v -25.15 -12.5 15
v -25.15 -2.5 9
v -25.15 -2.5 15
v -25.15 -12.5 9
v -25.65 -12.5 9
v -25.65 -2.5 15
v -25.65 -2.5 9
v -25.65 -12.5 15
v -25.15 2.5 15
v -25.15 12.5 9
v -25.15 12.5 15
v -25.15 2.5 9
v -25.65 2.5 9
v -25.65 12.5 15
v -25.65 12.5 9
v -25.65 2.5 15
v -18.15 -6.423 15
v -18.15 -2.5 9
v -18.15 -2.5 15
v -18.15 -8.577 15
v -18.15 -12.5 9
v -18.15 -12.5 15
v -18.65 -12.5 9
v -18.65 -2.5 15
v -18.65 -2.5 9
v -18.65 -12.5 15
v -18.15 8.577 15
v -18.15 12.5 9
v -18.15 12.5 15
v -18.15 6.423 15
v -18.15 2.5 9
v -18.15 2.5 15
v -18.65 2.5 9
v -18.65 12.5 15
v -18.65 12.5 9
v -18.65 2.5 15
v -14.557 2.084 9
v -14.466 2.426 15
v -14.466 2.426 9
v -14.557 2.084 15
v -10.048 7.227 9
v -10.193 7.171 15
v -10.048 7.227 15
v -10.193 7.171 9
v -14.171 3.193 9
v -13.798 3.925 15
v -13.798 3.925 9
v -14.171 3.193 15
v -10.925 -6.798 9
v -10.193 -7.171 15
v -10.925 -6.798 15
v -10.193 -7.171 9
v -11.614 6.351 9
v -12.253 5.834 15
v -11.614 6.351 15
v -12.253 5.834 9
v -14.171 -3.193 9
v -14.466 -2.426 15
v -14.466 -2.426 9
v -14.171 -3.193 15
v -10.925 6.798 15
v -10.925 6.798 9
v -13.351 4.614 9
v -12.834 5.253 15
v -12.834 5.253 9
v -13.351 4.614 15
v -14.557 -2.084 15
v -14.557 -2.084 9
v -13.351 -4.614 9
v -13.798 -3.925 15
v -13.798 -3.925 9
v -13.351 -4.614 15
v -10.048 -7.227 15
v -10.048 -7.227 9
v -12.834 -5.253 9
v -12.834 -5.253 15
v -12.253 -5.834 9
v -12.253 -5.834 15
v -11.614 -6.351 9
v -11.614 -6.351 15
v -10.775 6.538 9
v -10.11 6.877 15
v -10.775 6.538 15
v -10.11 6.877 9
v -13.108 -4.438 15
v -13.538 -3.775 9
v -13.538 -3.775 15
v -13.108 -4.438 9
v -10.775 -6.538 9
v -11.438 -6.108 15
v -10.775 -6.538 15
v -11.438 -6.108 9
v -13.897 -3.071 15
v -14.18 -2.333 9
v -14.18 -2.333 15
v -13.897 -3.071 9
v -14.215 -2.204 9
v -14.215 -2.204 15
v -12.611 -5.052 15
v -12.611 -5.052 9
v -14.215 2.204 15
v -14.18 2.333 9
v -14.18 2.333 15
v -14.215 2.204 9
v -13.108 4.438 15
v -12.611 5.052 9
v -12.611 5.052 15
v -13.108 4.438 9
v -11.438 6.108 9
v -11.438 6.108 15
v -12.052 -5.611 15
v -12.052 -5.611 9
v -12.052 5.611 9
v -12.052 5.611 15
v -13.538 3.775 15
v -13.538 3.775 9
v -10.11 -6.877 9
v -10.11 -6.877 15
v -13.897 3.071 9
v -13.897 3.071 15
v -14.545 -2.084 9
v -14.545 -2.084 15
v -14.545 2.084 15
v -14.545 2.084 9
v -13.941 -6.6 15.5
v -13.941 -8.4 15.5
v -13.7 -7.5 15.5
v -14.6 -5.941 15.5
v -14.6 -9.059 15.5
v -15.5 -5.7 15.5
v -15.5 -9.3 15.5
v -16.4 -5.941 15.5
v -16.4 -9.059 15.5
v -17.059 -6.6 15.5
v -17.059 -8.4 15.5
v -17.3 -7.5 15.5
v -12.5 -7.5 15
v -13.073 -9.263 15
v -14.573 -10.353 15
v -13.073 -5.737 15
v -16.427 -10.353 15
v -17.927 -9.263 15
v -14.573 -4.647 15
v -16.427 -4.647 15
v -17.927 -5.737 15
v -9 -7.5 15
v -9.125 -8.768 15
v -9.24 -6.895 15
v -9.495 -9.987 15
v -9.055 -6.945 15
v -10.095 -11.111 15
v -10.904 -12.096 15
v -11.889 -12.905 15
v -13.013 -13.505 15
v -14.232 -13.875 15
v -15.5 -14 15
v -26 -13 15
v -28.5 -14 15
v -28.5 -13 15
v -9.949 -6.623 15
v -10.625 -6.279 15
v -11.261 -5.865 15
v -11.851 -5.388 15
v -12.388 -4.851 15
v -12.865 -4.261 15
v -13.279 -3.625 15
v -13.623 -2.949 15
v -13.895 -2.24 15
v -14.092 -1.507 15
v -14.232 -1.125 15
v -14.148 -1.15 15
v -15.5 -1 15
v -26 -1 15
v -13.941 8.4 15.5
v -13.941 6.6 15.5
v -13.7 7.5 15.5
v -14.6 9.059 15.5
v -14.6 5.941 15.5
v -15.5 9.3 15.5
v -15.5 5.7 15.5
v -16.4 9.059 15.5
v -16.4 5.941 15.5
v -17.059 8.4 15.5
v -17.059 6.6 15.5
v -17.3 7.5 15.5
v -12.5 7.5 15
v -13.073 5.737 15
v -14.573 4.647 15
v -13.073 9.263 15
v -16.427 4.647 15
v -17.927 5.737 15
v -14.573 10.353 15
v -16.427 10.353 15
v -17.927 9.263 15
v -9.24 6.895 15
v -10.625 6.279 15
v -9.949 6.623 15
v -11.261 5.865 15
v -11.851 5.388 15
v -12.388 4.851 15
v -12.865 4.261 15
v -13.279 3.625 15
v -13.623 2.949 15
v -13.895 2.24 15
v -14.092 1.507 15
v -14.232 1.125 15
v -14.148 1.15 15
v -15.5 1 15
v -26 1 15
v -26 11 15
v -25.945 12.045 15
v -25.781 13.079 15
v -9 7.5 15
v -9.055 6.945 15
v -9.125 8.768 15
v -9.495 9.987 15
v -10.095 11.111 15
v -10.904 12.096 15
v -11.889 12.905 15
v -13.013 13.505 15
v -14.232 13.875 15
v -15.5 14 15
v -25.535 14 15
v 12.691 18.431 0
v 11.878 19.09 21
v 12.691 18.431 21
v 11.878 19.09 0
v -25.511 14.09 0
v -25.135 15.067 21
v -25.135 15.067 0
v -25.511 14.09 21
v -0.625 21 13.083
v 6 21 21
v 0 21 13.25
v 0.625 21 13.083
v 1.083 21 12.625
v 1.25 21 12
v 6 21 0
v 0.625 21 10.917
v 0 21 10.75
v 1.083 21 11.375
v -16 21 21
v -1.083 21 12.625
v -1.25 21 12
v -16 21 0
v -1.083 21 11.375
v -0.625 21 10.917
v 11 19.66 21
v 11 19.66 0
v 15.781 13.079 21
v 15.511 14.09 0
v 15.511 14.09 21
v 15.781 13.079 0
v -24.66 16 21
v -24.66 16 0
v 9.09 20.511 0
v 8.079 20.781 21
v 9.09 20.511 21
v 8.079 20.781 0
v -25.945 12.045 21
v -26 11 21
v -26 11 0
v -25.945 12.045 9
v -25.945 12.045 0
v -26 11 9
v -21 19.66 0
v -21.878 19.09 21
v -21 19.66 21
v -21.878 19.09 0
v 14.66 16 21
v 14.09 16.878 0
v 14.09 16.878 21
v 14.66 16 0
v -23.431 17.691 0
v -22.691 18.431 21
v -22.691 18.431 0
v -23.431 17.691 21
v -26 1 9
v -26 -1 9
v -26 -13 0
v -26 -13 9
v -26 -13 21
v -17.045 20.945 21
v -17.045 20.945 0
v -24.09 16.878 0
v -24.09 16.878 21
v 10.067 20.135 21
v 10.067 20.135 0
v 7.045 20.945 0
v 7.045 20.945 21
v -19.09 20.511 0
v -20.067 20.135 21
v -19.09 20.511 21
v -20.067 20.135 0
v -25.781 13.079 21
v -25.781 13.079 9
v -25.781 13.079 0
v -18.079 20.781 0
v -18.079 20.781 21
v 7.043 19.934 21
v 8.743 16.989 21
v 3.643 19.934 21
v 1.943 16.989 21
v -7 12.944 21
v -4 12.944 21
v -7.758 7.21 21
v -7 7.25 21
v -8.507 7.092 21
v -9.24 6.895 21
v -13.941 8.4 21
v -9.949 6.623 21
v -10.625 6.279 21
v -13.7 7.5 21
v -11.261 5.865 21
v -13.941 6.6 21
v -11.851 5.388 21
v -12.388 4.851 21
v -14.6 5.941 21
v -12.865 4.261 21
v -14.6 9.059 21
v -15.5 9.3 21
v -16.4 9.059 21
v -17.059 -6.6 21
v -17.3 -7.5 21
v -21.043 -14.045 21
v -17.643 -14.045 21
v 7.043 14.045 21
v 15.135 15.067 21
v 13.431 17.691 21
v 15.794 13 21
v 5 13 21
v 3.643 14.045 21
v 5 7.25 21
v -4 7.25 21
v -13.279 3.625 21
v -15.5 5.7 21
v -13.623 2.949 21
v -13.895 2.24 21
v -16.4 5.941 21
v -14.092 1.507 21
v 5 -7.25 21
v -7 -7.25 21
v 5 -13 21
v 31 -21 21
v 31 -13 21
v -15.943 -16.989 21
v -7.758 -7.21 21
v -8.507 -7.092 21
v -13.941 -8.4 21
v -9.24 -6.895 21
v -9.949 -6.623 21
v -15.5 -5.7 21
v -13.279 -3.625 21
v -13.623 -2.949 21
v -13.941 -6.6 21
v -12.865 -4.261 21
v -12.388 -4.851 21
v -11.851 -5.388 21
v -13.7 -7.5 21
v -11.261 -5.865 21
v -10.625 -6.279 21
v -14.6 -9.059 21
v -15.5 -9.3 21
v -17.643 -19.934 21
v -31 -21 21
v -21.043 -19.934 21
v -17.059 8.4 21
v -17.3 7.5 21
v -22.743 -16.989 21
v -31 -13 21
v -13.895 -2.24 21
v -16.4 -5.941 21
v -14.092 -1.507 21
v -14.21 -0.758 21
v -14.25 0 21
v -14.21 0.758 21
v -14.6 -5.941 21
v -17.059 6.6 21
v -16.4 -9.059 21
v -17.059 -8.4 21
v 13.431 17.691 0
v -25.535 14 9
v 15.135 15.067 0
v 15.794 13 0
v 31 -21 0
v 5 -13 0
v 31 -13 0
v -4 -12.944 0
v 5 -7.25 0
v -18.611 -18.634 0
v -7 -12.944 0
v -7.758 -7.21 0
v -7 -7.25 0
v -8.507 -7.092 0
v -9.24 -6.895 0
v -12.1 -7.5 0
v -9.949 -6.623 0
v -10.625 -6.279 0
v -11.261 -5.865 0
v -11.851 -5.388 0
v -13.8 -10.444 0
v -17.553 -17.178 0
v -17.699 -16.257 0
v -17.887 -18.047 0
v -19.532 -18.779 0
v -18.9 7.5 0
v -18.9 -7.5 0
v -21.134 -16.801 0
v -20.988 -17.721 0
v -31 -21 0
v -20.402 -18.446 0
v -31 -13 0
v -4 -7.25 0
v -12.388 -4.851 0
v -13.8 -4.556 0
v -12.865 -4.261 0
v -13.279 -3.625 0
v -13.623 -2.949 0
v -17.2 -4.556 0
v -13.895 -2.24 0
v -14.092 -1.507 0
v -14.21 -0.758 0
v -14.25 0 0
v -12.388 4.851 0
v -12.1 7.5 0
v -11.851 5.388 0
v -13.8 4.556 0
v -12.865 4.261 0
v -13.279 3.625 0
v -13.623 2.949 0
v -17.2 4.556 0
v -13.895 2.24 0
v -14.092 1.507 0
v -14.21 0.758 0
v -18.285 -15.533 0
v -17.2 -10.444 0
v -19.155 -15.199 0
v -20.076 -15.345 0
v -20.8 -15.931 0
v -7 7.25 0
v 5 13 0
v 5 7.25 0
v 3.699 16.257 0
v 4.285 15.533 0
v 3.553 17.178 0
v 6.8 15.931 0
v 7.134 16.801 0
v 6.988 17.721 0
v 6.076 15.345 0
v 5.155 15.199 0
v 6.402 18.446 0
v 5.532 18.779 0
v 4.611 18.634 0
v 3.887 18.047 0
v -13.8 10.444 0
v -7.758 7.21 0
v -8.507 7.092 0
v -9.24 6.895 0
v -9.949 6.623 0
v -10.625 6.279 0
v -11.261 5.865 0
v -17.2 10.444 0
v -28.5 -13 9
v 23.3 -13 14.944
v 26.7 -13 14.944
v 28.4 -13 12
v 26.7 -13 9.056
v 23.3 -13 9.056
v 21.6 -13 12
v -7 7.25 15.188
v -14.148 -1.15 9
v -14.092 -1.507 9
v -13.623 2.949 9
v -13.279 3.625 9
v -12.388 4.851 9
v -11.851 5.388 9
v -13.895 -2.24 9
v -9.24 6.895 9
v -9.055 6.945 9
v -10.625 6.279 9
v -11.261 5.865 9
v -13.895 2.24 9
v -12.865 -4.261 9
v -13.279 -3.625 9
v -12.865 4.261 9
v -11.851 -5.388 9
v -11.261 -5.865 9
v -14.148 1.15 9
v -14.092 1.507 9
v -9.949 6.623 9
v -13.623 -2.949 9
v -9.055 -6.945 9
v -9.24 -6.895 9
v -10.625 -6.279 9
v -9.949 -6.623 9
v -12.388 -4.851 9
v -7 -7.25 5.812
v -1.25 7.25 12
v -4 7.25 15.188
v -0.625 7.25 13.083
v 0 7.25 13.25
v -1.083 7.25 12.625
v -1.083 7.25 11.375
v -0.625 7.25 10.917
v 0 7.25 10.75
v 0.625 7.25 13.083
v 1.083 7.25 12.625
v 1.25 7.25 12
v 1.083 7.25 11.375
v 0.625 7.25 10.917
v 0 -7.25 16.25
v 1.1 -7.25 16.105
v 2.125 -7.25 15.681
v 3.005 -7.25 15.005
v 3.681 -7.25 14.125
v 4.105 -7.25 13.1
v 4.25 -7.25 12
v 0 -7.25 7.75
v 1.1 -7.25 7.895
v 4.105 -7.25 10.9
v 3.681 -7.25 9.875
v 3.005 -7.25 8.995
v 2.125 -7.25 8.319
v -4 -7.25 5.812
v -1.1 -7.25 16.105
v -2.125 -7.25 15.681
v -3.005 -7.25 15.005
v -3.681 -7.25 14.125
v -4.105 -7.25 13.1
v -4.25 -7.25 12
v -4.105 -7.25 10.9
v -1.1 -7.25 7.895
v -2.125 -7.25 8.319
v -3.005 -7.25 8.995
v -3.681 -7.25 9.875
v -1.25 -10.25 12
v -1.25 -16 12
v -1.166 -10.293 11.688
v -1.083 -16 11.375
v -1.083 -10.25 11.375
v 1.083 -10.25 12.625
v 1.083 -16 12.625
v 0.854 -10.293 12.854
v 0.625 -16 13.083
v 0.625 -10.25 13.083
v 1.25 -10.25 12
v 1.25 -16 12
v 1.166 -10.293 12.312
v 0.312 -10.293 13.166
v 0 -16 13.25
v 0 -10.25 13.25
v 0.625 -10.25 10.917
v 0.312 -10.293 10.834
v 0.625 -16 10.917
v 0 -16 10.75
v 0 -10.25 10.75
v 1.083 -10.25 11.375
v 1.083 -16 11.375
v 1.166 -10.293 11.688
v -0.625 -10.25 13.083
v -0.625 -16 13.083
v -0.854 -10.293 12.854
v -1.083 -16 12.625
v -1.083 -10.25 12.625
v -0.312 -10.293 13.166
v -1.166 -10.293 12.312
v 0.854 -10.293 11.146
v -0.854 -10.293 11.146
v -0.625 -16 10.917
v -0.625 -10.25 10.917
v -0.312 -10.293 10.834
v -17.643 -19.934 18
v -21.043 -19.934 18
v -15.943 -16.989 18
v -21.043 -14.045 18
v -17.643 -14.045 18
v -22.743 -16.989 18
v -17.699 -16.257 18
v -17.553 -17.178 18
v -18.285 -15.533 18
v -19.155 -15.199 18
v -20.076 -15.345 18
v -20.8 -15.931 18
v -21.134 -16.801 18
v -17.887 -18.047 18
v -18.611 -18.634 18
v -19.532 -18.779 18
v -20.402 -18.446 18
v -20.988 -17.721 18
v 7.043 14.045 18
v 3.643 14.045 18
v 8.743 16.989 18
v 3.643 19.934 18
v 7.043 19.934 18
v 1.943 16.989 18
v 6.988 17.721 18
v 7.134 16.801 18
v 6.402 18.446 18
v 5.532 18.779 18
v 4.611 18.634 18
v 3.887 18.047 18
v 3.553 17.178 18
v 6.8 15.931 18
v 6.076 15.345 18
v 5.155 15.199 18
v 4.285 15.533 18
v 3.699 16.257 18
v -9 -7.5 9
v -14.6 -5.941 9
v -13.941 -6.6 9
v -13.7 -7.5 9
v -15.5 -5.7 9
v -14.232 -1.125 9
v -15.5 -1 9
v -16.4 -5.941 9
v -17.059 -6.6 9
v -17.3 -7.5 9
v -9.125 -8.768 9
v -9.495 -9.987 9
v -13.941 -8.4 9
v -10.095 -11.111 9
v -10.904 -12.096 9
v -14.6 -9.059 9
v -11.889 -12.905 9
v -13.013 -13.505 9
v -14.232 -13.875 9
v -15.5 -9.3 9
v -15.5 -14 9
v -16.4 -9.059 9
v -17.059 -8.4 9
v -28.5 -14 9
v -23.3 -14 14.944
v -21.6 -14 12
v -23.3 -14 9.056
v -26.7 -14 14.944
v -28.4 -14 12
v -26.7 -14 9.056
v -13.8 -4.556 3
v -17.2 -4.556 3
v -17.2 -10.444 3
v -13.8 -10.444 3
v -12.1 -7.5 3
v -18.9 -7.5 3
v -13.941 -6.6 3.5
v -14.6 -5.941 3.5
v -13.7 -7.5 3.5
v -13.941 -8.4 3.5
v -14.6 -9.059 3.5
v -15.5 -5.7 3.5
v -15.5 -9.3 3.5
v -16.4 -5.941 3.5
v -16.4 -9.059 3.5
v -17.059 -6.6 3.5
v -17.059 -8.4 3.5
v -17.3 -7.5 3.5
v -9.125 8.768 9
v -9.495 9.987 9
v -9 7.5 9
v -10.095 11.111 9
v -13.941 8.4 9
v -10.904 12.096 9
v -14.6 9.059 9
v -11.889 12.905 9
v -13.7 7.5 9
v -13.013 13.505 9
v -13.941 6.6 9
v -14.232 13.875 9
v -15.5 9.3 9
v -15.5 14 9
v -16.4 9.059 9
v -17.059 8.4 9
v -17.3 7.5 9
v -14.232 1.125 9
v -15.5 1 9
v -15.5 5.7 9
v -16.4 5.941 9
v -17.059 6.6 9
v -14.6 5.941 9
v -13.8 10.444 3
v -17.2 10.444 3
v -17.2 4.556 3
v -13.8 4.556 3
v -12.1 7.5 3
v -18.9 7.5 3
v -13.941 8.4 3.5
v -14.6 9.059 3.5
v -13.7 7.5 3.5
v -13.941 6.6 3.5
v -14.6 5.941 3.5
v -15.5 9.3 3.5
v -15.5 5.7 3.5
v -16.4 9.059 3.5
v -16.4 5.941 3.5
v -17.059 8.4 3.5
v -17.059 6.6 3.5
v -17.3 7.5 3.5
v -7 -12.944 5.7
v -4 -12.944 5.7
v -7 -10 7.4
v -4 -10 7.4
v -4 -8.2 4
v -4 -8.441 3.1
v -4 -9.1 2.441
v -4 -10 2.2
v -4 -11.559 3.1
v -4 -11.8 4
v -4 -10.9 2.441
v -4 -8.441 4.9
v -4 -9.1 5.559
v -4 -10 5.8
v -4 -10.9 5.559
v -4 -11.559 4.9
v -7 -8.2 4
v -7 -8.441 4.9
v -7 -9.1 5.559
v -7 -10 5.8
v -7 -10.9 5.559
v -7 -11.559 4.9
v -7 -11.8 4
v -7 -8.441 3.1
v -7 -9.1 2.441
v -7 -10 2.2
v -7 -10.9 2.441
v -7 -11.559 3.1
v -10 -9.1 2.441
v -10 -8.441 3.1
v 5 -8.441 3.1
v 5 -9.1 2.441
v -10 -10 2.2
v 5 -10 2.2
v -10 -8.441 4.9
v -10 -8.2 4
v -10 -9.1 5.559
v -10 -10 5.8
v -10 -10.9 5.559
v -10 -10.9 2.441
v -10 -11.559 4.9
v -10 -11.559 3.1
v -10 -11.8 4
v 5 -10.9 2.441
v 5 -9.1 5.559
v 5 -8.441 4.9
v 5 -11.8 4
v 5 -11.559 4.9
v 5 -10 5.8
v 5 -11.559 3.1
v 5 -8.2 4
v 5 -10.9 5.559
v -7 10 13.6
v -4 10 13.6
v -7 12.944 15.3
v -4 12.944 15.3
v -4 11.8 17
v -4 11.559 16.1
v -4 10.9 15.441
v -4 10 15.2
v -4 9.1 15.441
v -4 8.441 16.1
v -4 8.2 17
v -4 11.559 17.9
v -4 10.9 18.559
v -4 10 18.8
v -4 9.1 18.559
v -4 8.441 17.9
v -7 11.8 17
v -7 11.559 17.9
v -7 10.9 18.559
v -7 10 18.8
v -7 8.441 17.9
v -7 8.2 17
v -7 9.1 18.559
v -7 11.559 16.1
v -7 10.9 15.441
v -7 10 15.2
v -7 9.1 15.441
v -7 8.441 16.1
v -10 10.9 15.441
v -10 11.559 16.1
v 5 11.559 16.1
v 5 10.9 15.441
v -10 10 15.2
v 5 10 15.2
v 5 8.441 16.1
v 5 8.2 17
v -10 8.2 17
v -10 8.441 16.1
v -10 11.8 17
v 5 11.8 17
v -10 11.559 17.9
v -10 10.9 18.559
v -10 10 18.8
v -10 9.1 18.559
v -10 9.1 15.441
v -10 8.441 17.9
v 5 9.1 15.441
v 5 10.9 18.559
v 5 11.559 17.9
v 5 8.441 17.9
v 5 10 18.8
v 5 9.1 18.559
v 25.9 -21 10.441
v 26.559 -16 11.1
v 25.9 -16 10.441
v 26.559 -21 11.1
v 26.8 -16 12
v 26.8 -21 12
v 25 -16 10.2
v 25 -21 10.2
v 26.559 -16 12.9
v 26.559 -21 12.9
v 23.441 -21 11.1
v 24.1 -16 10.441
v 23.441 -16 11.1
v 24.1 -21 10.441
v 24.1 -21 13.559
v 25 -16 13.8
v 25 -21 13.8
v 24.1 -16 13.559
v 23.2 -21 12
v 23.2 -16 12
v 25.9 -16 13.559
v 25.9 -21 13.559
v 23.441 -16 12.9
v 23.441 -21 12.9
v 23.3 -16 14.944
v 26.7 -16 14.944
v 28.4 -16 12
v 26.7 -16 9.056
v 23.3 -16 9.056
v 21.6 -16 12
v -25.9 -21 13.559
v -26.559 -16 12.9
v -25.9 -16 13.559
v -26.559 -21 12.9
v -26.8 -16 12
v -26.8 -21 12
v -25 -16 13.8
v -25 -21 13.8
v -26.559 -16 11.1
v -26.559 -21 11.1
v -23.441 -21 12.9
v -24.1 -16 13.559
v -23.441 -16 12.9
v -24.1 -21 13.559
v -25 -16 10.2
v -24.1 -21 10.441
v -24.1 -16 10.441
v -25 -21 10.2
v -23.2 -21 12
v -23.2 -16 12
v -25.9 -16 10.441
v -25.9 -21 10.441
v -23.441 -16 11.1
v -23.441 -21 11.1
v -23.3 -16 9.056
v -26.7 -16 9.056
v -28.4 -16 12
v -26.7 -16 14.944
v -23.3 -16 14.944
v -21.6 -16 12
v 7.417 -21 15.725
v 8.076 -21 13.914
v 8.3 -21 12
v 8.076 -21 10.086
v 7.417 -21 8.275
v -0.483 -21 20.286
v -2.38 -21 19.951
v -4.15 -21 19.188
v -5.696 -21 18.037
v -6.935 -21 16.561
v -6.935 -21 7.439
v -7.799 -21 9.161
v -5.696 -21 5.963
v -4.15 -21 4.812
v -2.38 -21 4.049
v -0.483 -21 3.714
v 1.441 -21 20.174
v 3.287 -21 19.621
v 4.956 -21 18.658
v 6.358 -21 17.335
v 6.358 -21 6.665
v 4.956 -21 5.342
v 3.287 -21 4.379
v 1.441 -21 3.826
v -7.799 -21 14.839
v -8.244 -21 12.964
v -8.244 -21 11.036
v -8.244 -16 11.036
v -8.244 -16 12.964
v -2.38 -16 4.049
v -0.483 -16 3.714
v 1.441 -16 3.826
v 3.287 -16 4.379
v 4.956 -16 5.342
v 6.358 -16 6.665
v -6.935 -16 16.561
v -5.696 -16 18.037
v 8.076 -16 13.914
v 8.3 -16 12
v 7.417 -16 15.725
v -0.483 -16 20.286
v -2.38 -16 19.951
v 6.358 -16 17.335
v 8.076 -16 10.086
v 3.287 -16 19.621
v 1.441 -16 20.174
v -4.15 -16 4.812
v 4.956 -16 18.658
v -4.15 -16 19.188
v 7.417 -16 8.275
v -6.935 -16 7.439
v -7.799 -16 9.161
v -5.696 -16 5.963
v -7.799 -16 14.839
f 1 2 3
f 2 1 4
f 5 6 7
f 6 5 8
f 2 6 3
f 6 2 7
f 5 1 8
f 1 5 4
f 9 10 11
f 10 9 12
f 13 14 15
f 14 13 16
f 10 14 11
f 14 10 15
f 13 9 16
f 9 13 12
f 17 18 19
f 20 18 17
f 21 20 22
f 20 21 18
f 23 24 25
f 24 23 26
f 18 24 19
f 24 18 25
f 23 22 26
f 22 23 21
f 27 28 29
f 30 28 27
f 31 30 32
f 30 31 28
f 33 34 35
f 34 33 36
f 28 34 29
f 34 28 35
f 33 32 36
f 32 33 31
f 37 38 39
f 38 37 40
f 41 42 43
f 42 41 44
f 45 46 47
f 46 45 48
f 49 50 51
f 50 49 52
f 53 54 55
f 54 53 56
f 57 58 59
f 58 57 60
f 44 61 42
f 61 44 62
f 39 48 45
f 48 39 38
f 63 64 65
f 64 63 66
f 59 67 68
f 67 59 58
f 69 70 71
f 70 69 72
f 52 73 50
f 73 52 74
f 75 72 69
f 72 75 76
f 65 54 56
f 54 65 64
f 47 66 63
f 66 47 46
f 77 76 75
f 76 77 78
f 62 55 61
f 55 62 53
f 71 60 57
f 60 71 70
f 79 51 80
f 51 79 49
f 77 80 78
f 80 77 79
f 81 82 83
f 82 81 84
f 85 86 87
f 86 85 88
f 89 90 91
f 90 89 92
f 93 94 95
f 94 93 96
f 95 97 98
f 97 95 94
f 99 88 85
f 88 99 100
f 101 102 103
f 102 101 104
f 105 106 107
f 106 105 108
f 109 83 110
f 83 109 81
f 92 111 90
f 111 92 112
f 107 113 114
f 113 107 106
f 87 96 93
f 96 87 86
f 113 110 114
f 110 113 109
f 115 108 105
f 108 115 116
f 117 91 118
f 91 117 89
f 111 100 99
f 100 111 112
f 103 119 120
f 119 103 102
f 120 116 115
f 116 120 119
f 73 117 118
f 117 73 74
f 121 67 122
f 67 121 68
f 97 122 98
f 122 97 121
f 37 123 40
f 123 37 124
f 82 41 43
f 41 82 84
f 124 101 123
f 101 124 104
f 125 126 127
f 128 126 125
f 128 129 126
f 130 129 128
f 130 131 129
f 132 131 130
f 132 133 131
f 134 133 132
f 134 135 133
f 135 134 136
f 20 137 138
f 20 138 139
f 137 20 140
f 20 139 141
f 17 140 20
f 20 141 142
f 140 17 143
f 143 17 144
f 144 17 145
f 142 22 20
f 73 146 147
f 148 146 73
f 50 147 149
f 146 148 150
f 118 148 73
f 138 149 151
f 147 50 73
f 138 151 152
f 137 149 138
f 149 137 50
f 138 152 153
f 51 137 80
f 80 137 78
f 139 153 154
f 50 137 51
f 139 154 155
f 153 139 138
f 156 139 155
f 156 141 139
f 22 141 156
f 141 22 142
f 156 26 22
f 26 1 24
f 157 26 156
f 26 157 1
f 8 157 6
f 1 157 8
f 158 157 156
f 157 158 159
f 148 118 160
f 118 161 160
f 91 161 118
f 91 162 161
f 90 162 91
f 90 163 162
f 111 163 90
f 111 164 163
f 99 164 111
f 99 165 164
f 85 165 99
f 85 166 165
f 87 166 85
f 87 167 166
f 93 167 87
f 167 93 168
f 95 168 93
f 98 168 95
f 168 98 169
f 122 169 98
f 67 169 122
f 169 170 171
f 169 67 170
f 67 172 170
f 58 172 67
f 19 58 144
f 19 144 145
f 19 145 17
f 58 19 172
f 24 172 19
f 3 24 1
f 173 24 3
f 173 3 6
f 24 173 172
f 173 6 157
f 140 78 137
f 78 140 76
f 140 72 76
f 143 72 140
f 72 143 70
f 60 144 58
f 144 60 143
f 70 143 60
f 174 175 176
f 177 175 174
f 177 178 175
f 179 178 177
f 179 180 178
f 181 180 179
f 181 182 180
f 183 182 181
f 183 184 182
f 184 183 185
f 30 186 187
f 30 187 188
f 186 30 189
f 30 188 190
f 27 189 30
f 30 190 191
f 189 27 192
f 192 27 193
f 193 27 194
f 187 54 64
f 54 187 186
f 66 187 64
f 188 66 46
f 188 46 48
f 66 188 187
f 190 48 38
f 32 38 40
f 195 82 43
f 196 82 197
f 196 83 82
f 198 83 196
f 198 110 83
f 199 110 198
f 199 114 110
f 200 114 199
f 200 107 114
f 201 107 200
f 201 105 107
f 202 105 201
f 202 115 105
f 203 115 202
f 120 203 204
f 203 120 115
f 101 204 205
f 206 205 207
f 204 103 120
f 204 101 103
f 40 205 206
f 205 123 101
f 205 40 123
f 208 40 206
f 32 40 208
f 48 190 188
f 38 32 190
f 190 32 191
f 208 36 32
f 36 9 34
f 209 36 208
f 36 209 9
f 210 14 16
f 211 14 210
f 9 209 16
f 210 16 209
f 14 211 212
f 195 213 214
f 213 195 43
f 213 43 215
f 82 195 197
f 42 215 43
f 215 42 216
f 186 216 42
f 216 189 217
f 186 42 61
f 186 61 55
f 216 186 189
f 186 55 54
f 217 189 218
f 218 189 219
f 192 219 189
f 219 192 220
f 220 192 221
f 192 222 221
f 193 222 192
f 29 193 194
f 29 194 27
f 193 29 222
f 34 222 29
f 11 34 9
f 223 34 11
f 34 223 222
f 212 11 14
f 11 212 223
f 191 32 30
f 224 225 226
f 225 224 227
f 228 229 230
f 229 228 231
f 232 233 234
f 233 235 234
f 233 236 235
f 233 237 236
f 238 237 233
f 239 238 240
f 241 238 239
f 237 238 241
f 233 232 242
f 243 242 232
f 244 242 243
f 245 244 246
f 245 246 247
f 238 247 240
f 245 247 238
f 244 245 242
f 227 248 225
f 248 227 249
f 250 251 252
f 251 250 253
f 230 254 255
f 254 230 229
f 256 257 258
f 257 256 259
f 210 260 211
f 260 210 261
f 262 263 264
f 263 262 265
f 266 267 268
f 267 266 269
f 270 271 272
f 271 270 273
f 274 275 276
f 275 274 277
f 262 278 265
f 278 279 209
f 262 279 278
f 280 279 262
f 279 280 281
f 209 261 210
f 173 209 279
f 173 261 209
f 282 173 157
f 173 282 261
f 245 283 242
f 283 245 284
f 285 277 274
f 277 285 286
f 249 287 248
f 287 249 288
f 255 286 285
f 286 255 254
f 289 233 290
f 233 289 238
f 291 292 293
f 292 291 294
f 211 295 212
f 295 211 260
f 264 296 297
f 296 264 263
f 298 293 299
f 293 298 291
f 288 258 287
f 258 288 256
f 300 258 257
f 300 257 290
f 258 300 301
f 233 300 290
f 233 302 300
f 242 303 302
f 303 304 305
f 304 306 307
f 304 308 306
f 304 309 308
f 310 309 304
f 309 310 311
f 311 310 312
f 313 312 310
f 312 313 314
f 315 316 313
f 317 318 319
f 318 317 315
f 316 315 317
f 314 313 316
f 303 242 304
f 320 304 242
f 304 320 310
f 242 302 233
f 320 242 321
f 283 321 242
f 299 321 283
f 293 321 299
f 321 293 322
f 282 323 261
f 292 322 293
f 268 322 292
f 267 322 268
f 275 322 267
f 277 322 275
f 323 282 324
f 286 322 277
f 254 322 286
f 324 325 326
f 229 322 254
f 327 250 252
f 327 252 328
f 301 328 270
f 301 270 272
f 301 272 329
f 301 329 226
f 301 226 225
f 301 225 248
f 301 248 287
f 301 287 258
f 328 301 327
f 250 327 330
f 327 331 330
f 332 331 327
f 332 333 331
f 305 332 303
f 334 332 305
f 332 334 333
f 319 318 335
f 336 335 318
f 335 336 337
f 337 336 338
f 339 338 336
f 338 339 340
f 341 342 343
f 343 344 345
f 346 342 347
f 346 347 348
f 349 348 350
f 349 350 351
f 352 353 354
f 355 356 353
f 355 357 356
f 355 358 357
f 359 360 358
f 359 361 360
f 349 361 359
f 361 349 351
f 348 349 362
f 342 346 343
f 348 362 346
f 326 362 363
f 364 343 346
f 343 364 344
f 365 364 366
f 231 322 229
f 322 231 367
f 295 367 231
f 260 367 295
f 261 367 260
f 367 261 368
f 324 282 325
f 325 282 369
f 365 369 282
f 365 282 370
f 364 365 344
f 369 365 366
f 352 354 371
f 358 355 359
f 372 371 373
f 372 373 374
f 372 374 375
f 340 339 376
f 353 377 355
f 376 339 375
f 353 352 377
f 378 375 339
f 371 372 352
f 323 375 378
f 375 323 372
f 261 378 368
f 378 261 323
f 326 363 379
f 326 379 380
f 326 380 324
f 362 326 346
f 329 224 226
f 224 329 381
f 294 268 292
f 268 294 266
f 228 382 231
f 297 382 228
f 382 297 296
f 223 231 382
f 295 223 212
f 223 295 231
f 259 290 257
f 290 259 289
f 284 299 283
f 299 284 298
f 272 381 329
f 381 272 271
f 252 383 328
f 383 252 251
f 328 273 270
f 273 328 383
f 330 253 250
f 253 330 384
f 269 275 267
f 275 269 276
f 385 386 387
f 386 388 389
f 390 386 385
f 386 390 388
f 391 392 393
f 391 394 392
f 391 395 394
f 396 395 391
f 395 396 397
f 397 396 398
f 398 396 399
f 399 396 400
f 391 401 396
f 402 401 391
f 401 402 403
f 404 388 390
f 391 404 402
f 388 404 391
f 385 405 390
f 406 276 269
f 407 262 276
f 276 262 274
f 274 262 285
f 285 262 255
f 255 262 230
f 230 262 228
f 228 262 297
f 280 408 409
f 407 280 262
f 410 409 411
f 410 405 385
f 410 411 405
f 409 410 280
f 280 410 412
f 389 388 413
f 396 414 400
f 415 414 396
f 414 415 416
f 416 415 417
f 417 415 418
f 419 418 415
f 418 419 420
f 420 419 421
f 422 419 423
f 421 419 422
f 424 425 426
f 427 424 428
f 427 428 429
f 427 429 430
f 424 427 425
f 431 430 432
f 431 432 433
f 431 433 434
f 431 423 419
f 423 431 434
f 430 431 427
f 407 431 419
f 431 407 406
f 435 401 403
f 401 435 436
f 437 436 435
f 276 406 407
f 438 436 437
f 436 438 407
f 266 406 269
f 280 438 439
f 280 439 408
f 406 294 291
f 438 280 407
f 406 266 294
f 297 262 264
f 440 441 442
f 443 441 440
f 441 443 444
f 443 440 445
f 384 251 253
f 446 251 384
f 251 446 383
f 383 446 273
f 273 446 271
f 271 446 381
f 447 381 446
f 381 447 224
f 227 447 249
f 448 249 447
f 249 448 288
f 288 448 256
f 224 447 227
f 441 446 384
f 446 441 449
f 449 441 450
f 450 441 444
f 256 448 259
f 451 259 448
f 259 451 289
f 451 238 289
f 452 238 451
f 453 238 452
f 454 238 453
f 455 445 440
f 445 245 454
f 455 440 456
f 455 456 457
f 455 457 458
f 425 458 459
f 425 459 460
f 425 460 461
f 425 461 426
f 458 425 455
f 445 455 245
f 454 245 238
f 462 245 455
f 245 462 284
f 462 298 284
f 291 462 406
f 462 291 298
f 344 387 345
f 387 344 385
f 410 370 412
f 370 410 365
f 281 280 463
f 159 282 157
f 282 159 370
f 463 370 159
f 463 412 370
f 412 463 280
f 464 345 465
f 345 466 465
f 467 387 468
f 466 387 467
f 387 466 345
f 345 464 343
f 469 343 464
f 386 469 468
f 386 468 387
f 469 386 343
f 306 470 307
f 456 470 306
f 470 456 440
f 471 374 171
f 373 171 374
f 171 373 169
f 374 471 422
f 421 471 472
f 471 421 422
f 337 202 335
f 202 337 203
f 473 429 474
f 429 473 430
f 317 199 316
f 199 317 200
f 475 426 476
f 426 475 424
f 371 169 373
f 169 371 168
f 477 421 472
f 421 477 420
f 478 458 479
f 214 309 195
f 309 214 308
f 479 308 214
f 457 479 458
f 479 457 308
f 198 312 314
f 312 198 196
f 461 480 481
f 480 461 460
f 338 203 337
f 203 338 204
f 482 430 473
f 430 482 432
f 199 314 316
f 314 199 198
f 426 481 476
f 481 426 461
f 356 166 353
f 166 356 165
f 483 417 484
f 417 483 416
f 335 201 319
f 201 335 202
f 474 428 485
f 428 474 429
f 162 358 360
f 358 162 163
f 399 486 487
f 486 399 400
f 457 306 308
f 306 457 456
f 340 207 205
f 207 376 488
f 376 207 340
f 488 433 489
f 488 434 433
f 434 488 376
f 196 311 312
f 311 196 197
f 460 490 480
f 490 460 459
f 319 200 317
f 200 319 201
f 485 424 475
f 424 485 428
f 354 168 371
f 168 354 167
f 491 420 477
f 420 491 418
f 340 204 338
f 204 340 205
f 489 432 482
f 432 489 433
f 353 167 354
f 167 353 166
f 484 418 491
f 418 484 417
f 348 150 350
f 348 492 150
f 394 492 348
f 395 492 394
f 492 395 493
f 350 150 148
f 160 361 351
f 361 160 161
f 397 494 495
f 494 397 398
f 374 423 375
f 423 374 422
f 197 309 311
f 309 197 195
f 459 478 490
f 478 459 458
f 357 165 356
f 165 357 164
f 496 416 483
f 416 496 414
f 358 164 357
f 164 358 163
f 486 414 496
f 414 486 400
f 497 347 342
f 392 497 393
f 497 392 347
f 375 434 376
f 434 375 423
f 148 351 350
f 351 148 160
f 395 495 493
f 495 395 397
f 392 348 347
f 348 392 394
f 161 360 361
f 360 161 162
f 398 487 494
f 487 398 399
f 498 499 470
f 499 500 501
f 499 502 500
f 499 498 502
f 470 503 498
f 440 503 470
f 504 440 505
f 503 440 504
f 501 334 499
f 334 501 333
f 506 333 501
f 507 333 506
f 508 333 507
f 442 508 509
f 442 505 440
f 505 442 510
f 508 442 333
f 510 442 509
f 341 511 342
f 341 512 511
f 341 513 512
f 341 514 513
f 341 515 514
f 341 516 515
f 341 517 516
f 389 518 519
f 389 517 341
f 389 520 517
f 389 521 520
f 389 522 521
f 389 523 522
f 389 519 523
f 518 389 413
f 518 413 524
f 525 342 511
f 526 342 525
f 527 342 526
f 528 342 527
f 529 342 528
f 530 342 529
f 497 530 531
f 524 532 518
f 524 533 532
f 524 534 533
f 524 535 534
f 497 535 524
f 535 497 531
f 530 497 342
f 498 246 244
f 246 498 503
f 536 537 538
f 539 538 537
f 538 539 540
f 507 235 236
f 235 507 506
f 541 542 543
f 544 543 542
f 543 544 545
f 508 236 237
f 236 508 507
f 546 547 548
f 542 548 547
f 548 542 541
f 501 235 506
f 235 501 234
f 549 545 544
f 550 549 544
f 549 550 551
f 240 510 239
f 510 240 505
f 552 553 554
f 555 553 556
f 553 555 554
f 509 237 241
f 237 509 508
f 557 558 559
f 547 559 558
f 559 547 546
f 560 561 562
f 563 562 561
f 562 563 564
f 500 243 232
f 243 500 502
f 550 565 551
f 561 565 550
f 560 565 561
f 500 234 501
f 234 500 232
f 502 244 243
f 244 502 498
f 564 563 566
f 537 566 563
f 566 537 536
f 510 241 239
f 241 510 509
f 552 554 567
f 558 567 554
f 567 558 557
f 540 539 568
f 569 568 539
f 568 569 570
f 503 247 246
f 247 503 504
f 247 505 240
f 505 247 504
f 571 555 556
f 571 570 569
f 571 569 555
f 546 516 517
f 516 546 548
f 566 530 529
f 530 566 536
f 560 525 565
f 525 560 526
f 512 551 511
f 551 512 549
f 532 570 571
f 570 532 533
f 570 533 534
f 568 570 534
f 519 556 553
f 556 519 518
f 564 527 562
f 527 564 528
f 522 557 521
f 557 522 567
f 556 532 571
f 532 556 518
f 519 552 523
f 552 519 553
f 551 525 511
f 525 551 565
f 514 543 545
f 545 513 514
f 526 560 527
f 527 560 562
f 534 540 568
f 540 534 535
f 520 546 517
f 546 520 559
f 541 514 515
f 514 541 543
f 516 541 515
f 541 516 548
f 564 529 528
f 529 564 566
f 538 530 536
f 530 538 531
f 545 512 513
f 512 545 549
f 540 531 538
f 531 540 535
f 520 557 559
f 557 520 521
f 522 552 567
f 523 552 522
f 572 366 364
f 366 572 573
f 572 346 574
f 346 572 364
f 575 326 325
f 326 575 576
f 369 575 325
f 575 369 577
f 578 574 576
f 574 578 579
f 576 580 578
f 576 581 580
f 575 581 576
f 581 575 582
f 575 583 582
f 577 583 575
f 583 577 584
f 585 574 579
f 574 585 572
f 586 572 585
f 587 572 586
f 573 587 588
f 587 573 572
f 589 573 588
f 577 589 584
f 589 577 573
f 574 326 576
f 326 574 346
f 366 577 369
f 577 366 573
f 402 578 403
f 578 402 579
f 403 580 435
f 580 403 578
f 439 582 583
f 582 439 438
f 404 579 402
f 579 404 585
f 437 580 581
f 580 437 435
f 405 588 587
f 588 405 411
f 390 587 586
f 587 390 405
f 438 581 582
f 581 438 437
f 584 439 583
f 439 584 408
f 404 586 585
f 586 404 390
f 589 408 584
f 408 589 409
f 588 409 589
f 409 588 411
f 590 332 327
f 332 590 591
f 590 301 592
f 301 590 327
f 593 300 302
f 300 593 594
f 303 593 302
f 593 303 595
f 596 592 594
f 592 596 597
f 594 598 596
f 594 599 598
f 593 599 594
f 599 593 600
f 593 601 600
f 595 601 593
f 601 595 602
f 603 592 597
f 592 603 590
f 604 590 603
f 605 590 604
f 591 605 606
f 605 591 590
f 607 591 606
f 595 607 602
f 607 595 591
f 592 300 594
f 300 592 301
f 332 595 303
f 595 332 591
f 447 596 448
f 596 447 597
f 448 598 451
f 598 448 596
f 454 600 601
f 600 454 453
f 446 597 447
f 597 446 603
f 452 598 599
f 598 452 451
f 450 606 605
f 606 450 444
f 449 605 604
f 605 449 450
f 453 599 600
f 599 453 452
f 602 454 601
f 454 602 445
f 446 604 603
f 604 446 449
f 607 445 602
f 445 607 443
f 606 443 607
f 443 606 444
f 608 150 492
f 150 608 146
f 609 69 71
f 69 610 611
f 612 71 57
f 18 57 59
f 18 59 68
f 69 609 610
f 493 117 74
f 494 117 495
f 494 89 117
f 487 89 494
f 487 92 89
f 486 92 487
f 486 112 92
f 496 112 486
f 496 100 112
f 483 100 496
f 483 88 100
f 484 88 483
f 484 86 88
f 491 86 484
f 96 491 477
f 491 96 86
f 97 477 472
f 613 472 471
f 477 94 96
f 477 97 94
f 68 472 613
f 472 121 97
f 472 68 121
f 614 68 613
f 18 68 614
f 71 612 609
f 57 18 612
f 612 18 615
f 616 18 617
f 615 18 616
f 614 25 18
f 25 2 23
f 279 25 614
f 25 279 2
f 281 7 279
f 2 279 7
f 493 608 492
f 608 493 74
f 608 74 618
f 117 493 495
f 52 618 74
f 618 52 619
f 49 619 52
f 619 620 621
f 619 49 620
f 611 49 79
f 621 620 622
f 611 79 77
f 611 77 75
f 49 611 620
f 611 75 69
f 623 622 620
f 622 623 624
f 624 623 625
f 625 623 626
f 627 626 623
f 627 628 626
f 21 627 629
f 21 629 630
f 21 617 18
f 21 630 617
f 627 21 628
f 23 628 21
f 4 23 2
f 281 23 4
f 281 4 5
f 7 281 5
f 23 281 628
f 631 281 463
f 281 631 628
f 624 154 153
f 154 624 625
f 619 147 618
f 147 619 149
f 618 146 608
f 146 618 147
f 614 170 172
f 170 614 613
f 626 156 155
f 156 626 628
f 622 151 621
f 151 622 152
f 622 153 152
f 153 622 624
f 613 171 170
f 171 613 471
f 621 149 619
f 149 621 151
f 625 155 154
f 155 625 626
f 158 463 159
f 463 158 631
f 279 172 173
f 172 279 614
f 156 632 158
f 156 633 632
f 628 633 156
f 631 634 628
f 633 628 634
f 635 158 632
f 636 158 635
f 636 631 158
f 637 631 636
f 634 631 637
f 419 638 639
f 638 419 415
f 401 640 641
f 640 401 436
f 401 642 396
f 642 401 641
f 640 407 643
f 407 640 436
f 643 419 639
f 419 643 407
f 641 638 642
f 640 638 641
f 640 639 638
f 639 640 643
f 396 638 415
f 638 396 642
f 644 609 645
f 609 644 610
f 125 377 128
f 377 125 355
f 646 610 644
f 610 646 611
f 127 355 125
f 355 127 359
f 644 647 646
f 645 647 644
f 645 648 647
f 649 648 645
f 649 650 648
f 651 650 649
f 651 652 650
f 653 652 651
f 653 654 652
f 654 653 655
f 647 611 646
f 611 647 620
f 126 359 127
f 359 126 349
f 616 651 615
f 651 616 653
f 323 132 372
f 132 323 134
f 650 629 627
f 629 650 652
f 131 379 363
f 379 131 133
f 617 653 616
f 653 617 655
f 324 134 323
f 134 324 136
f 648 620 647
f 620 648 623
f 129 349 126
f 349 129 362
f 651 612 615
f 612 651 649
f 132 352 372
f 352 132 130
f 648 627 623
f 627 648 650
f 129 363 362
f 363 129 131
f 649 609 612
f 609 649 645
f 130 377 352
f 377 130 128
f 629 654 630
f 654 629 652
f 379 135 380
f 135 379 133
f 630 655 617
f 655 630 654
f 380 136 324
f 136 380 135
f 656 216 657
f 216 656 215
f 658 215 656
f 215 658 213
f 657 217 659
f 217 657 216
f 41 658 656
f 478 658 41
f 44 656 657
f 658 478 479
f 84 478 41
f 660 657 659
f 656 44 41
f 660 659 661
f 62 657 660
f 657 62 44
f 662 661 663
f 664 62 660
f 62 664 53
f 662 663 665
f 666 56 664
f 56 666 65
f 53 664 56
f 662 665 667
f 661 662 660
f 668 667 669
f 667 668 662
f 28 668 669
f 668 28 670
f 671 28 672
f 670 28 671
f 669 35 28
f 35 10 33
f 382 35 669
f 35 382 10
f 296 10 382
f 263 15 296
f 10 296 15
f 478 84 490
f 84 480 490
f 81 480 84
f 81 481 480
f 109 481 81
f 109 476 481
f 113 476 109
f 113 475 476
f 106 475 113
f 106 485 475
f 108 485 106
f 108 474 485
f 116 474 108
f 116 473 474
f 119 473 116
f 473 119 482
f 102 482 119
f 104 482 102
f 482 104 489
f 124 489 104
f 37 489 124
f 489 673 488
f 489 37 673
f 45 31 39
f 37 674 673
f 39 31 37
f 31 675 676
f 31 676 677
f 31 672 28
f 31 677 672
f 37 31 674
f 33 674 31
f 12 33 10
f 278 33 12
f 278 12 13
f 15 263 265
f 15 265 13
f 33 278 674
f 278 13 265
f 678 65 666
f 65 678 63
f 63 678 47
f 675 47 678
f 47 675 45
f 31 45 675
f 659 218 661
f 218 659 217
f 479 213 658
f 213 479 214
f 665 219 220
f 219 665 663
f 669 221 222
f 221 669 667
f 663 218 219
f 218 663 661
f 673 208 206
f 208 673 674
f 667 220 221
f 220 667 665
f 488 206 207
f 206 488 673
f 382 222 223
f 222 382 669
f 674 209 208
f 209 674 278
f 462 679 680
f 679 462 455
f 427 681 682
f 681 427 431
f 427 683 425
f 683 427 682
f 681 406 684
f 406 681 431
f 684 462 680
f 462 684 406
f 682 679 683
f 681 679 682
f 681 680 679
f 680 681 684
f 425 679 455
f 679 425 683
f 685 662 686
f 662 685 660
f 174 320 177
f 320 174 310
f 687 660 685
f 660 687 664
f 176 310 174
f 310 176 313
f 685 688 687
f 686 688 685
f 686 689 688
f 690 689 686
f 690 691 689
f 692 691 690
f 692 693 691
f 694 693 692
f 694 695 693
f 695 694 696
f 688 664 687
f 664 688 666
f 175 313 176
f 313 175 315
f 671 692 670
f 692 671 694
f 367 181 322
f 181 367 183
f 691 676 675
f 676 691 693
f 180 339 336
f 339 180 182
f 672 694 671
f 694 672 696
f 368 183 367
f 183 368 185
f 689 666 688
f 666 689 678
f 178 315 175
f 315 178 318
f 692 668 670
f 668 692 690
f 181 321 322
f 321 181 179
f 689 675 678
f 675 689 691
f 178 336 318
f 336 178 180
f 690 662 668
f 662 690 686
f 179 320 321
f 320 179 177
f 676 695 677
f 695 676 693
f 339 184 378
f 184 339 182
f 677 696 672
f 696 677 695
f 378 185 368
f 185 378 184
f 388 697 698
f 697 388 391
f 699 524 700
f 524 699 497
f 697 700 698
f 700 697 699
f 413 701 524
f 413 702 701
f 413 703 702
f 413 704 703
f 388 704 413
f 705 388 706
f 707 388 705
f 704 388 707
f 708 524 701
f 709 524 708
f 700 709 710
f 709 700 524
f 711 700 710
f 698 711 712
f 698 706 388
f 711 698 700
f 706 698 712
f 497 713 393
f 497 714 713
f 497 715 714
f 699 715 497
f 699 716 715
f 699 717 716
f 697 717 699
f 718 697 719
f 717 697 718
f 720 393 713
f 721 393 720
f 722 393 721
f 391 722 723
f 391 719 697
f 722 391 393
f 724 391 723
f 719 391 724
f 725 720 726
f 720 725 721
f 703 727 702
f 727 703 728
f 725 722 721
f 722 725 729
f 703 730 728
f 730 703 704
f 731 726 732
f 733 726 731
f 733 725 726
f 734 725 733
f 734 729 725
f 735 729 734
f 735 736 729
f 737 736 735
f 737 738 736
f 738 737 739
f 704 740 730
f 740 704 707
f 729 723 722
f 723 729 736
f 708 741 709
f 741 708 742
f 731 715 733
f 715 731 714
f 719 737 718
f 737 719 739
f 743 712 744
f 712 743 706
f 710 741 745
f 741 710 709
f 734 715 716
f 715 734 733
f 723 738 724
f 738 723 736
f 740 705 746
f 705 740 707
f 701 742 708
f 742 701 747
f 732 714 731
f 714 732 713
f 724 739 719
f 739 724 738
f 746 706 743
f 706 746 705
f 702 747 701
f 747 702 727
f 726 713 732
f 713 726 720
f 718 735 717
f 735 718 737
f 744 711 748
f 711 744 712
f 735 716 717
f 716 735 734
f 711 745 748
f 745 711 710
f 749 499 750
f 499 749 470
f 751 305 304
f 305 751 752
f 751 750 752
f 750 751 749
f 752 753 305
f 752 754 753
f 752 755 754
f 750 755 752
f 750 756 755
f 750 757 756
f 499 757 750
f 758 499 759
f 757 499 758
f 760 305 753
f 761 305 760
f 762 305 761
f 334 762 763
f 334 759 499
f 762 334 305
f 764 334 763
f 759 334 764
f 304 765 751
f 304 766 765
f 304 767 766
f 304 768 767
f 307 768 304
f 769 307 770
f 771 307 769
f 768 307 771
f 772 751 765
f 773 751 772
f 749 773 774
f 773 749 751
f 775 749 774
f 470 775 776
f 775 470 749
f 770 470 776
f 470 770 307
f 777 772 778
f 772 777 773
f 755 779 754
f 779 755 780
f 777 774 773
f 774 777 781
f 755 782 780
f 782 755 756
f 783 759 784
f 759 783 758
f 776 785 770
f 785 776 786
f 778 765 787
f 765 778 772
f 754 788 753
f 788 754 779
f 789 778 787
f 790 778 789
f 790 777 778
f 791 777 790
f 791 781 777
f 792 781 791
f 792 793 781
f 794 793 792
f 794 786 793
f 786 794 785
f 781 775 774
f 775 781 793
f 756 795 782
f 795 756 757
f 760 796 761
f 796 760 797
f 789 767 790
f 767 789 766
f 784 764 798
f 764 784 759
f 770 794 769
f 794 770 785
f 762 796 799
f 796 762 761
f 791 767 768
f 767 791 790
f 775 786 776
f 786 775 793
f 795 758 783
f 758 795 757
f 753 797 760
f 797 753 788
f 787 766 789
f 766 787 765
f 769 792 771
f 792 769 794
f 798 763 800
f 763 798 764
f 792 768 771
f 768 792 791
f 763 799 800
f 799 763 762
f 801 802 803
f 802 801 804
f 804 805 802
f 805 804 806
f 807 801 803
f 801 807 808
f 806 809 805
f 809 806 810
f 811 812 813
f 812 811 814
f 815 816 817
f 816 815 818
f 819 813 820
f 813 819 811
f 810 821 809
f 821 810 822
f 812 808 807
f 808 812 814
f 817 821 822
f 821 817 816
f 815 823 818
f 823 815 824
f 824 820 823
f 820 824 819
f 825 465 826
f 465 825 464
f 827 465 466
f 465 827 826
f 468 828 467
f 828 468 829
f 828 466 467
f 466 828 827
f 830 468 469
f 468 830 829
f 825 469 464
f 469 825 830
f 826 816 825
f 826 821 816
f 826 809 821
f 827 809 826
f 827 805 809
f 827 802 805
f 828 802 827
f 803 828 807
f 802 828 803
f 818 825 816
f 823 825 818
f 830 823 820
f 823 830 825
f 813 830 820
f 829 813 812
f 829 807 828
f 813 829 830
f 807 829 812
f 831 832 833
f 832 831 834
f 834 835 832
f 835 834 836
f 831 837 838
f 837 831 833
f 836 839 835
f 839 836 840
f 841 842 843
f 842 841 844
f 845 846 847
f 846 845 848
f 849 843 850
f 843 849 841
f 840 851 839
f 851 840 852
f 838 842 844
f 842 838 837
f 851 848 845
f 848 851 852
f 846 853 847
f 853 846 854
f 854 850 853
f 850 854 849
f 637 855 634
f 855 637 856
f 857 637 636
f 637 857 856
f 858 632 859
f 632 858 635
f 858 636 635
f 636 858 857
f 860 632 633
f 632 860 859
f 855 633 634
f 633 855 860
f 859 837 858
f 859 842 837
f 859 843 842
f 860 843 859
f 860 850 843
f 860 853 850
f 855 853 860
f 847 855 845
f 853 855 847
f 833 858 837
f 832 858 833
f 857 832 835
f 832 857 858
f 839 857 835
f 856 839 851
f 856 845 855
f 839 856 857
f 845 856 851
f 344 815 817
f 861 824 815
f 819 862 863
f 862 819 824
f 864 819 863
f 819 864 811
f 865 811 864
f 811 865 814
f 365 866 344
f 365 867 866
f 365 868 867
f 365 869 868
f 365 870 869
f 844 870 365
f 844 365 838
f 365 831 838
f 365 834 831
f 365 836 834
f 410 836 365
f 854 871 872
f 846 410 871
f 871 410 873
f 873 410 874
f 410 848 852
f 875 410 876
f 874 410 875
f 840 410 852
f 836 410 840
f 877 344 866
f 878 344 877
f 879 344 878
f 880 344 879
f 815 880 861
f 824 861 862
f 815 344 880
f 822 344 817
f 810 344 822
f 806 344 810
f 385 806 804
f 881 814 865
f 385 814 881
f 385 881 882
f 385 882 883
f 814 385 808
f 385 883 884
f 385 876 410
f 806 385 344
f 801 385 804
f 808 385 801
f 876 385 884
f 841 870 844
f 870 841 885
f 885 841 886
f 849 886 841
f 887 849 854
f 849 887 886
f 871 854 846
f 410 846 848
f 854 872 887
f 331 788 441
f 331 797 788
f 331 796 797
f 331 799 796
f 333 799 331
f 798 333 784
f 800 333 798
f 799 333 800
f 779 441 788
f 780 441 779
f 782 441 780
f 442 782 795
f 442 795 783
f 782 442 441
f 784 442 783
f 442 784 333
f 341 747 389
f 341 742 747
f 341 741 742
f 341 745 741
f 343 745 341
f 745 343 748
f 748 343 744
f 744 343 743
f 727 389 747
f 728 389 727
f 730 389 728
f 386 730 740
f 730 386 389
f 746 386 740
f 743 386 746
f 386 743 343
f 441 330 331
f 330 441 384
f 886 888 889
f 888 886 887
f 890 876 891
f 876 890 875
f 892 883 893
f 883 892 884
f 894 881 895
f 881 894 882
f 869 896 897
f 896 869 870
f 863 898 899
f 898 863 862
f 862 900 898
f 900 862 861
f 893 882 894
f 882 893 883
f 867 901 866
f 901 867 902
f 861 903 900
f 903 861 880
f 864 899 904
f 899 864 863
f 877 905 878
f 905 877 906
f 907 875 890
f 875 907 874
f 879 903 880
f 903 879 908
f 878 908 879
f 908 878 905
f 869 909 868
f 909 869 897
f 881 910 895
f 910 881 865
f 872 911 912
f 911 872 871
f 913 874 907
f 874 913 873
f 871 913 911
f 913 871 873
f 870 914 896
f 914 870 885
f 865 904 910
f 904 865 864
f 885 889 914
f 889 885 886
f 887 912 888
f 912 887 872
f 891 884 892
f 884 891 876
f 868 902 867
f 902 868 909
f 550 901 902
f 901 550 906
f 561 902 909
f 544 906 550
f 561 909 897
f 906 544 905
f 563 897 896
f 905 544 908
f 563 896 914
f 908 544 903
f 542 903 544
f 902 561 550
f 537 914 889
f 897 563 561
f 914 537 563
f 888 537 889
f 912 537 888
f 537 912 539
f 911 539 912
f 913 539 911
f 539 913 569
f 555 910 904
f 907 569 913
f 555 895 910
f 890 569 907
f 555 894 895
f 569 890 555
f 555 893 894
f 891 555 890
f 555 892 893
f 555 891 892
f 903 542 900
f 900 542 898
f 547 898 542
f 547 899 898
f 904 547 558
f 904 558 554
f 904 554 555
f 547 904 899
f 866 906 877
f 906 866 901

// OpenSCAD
// Based on MendelMax J-Head Micro-Extruder V5 by Ultibots:
// http://www.thingiverse.com/thing:42112
//
// Completely rewritten in OpenSCAD by Johann on 2013-01-19.

bearing_id = 3; // 623zz bearings are 3x10x4mm.
bearing_od = 10;
bearing_width = 4;
bearing_offset = 1.5;

body_height = 42;
body_width = 42; // V5: 52mm.
body_offset = 5; // V5: 7mm.
body_thickness = 21;
body_roundness = 10;

groovemount_od = 16.6; // 16mm nominal.
groovemount_height = 5; // Must push down on GrooveMount.

drive_gear_offset = 7;
drive_gear_width = 12;
drive_gear_id = 5;
drive_gear_od = 13;

cutout_id = 14.5;
cutout_height = 26;

funnel_depth = 5;
filament_offset = 1.5;
filament_id = 2.5; // This is for 1.75mm filament.

foot_width = 62;
foot_offset = 0; // V5: 2mm but most GrooveMount plates are centered.

motor_mount_radius = 21;
motor_mount_angle = 54;

m3_radius = 1.8;
m3_nut_radius = 3.4;
m3_nut_height = 3;

m4_radius = 2.3;
m4_nut_radius = 4.5;
m4_nut_width = 7.5;
m4_nut_height = 4;

bearing_x = 15.5;
bearing_y = 7.5;

idler_x = -5.5;
idler_y = 10;
idler_z = 6.5;

module pg35l_extruder() {
  union() {
    // Single wall support surfaces, to be removed after printing.
    for (x = [-body_width/2, -body_width/3]) {
      for (y = [-bearing_y, bearing_y]) {
	translate([x-body_offset+0.6, y, bearing_offset])
	  cube([0.5, bearing_od, body_thickness*2/3], center=true);
      }
    }
    intersection() {
      translate([-drive_gear_offset, 0, 0]) difference() {
        cylinder(r=cutout_id/2+0.6, h=body_thickness-2, center=true, $fn=60);
        cylinder(r=cutout_id/2+0.3, h=body_thickness-1, center=true, $fn=60);
      }
      union() {
        for (y = [-bearing_y, bearing_y]) {
	  translate([-bearing_x, y, bearing_offset]) {
	    cylinder(r=bearing_od/2+0.5, h=body_thickness/2, center=true);
	    % cylinder(r=bearing_od/2, h=bearing_width, center=true);
	  }
	}
      }
    }
    // Bridge M3 screw holes above bearing spaces.
    for (y = [-bearing_y, bearing_y]) {
      translate([-bearing_x, y, bearing_offset+bearing_width/2+1.25]) {
	cylinder(r=3, h=0.5, center=true);
      }
    }
    difference() {
      union() {
	// Rounded top.
	translate([-body_offset, -body_roundness, 0]) minkowski() {
	  cube([body_width-2*body_roundness, body_height, body_thickness-1],
	       center=true);
	  cylinder(r=body_roundness, h=1, center=true, $fn=60);
	}
	// Foot.
	translate([-foot_offset, -body_height/2, 0])
	  cube([foot_width, 16, body_thickness], center=true);
      }
      // Uncomment the following line to look inside.
      // translate([-30, 0, 16]) cube([60, 30, 30], center=true);
      // Flat bottom.
      translate([0, -body_height/2-20, 0])
	cube([2*body_width, 40, body_thickness+1], center=true);
      // Drive gear cutout.
      translate([-drive_gear_offset, 0, 0]) {
	cylinder(r=cutout_id/2, h=body_thickness+1, center=true, $fn=60);
	translate([20, 0, 0])
	  cube([40, cutout_id, body_thickness+1], center=true);
      }
      // Idler cutout.
      translate([25, 0, 0])
	cube([40, cutout_height, body_thickness+1], center=true);
      // Filament path and funnel.
      translate([0, 0, filament_offset]) rotate([90, 0, 0]) {
	cylinder(r=filament_id/2, h=2*body_height, center=true, $fn=12);
	translate([0, 0, funnel_depth])
	  cylinder(r1=drive_gear_od, r2=0, h=drive_gear_od,
		   center=true, $fn=24);
      }
      // Motor mount screws.
      translate([-drive_gear_offset, 0, 0])
      for (x = [-motor_mount_radius, motor_mount_radius]) {
	rotate([0, 0, motor_mount_angle])
	  translate([x, 0, body_thickness/2-m3_nut_height]) {
	  rotate([0, 0, -motor_mount_angle])
	    cylinder(r=m3_nut_radius, h=m3_nut_height*2, $fn=6);
	  translate([0, 0, 0.5]) rotate([180, 0, 0])
	    cylinder(r=m3_radius, h=body_thickness, $fn=12);
	}
      }
      // Bearing spaces and mount screws.
      for (y = [-bearing_y, bearing_y]) {
	translate([-bearing_x, y, bearing_offset]) {
	  cylinder(r=(bearing_od+3)/2, h=bearing_width+2, center=true, $fn=32);
	  translate([-6.5, 0, 0])
	    cube([13, bearing_od+3, bearing_width+2], center=true);
	}
	translate([-bearing_x, y, m3_nut_height-body_thickness/2]) {
	  rotate([180, 0, 0])
	    cylinder(r=m3_nut_radius, h=m3_nut_height*2, $fn=6);
	  translate([0, 0, 0.5])
	    cylinder(r=m3_radius, h=body_thickness, $fn=12);
	}
      }
      // Idler screws.
      for (i = [-1, 1]) {
	translate([0, i*idler_y, i*idler_z]) rotate([0, 90, 0]) {
	  cylinder(r=m3_radius, h=20, center=true, $fn=12);
	  for (x = [0, -3*i])
	    translate([x, 0, idler_x])
	      cylinder(r=m3_nut_radius, h=m3_nut_height, center=true, $fn=6);
	}
      }
      // Foot mounting screws and nut pockets.
      translate([-foot_offset, 5-body_height/2, filament_offset])
      for (a = [0, 180]) {
	rotate([-90, a, 0]) translate([25, 0, 0]) {
	  cylinder(r=m3_radius, h=13, center=true, $fn=12);
	  cylinder(r=m3_nut_radius, h=7, $fn=6);
	}
      }
      // Groove mount.
      translate([0, -body_height/2, filament_offset]) rotate([90, 0, 0])
	cylinder(r=groovemount_od/2, h=2*groovemount_height, center=true);
    }
  }
  // Drive gear.
  % translate([-drive_gear_offset, 0, 0]) difference() {
    cylinder(r=drive_gear_od/2, h=drive_gear_width, center=true);
    cylinder(r=drive_gear_id/2, h=drive_gear_width+1, center=true, $fn=12);
  }
}

translate([0, 0, body_thickness/2]) pg35l_extruder();

// Uncomment the following line for reference.
// translate([2, -21, 0]) % import("me_body_v5.1_3mm.stl");
